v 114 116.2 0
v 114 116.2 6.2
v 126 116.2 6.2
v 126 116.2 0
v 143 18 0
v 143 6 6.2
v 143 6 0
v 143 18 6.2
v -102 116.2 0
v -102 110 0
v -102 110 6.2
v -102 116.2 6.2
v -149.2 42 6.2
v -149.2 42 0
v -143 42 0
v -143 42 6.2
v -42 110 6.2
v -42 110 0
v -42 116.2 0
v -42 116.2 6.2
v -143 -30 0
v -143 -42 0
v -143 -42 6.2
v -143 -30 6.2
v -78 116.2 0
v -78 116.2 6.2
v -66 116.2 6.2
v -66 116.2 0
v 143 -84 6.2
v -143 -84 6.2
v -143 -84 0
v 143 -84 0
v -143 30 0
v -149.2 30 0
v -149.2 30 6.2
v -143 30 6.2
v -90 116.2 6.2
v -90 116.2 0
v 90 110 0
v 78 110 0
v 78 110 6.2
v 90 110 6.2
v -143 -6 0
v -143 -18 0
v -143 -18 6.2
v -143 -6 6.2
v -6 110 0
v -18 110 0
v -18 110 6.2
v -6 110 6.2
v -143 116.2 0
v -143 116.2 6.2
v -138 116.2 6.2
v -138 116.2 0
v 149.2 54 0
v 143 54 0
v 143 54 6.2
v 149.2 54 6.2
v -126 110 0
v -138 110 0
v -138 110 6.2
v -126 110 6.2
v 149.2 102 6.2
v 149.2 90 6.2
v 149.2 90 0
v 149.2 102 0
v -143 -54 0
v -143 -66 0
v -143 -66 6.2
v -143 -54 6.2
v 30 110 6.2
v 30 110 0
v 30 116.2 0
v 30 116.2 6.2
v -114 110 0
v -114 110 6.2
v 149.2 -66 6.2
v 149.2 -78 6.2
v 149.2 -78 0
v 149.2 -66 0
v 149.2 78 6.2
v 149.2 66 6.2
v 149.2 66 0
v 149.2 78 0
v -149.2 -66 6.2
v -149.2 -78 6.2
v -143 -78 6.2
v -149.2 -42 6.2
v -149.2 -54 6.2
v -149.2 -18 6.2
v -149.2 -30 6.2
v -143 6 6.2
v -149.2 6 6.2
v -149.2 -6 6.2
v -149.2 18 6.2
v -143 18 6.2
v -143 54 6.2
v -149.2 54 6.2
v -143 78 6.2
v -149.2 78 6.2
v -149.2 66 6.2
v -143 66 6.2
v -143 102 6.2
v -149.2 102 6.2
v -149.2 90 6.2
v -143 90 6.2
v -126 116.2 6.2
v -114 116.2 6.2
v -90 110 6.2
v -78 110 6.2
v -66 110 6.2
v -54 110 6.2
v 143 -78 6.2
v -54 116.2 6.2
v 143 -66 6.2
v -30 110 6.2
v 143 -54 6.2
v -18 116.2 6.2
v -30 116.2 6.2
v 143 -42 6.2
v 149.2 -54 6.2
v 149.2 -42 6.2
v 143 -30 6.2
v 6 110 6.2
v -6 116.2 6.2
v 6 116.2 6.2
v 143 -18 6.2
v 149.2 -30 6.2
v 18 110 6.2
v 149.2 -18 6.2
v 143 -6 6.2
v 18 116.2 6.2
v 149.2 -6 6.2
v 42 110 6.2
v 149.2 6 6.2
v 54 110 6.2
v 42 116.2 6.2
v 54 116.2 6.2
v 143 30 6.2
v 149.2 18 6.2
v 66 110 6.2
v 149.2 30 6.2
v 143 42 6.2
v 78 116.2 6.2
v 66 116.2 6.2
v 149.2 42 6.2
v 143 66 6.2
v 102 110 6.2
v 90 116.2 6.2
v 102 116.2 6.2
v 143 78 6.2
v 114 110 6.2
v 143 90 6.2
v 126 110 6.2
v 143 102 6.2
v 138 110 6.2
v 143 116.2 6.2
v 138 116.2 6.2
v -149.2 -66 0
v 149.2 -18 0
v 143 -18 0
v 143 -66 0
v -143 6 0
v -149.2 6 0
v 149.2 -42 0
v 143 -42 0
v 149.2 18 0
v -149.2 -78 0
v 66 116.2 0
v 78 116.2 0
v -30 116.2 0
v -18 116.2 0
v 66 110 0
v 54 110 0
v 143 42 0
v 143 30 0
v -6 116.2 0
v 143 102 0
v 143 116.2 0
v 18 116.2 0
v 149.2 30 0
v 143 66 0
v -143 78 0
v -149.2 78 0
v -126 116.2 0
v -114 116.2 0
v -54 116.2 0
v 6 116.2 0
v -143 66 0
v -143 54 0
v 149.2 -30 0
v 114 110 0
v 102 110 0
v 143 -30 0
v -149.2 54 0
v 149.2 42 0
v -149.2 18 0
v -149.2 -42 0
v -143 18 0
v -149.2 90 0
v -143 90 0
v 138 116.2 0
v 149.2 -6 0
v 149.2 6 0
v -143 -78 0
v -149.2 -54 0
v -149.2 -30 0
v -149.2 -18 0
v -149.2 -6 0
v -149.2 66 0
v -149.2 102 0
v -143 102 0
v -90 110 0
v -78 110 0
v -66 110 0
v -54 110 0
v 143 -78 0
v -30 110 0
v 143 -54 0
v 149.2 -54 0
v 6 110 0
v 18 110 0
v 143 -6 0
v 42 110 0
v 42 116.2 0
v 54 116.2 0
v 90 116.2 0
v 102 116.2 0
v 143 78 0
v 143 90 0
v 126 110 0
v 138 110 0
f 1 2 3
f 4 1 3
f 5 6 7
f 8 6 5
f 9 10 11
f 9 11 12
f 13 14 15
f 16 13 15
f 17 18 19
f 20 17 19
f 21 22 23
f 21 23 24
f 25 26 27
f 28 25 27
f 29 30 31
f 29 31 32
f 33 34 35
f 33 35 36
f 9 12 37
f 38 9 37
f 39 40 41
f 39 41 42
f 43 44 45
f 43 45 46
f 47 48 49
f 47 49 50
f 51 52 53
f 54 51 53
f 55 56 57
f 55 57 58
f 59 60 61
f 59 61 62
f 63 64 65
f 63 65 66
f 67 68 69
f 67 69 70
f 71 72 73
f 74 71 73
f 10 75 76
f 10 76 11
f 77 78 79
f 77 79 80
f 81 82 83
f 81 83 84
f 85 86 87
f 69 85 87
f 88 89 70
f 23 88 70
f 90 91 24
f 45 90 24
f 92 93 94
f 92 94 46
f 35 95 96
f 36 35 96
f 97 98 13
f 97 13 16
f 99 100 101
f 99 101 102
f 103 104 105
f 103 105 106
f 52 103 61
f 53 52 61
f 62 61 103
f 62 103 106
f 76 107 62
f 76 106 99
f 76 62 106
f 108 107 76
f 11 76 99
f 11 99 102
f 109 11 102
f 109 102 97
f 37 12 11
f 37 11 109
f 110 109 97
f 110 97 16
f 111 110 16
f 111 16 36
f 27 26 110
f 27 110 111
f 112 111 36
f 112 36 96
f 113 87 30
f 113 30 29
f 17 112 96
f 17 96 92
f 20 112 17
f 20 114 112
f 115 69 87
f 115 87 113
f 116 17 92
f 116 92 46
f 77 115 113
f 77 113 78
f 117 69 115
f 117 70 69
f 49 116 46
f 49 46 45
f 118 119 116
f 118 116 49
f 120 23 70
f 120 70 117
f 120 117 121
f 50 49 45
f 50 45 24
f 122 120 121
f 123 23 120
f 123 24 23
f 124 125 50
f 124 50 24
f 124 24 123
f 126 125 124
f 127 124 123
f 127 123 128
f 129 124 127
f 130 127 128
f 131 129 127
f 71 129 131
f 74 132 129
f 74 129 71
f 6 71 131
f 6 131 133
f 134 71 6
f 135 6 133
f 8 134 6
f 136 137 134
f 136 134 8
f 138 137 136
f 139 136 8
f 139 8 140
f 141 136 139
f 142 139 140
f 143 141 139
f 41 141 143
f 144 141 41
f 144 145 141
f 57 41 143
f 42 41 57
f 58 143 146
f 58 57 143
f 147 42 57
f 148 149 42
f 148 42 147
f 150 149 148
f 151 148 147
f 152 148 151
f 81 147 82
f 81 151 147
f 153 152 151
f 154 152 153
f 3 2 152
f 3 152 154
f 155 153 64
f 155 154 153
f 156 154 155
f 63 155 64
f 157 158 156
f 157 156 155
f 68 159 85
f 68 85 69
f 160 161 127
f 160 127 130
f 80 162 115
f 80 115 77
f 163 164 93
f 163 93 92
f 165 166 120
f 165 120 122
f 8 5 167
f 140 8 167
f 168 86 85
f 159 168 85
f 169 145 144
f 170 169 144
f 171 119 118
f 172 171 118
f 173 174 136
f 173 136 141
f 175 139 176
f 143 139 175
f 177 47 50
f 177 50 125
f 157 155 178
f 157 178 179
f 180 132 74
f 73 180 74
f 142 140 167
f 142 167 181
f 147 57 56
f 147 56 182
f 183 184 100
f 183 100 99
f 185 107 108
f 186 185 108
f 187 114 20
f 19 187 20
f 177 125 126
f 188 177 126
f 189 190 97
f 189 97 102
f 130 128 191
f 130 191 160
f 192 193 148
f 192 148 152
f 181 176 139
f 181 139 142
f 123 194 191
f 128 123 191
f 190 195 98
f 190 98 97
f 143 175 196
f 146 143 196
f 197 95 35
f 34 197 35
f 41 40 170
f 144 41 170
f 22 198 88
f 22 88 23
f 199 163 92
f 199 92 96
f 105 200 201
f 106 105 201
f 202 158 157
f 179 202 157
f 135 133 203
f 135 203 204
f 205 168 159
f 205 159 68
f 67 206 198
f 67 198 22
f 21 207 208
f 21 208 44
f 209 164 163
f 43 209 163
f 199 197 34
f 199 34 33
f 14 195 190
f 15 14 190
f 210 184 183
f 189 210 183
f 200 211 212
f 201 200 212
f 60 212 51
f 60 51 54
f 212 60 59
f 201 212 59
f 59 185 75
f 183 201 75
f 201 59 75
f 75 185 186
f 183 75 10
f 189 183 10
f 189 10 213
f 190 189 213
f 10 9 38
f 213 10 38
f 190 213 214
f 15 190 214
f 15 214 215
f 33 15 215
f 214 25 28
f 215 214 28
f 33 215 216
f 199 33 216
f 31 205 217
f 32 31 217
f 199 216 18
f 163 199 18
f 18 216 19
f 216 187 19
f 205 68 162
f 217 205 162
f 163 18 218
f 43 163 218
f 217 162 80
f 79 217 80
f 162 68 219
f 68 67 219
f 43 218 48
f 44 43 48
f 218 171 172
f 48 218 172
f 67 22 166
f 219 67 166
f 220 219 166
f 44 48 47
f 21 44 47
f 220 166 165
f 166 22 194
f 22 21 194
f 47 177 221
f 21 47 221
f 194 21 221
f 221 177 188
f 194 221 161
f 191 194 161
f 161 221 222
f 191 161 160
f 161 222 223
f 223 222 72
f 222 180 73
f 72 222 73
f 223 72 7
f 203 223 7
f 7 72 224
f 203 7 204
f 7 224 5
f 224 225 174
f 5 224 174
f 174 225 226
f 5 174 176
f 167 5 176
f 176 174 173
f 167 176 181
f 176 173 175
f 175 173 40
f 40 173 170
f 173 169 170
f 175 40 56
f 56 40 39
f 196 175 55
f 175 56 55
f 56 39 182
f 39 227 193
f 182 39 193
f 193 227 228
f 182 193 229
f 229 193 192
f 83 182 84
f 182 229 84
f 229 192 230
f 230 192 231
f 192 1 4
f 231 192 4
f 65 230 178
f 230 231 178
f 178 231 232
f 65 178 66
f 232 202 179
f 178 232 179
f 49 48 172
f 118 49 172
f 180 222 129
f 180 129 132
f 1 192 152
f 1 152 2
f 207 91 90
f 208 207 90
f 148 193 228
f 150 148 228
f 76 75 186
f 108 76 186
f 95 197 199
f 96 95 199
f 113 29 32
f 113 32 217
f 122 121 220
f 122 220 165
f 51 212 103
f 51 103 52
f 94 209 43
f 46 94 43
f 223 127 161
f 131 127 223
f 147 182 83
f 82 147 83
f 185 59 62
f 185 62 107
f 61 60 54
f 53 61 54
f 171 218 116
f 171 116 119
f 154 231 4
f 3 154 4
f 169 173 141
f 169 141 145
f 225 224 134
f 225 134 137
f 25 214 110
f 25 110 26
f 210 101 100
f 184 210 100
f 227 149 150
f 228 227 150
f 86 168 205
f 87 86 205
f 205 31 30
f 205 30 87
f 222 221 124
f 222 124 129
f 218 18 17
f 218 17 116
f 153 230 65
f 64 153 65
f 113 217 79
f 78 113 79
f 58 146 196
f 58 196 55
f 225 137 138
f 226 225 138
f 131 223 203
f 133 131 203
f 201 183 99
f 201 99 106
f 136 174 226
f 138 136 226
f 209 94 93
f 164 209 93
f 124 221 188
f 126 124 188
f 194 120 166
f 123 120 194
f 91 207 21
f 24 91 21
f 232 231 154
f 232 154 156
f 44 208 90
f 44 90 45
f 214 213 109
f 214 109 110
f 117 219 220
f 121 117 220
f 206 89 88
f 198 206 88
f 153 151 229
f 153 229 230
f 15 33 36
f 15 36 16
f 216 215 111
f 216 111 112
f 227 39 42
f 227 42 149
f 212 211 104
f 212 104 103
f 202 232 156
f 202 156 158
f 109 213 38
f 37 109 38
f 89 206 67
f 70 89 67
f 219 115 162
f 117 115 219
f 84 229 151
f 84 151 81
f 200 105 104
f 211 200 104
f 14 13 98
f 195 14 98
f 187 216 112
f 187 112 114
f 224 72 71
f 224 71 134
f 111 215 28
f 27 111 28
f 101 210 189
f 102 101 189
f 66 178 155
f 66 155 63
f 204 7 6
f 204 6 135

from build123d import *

# Parameters (mm, degrees)
F0_W     = 286
F0_H     = 220
F1_DEPTH = 6.2
F2_W     = 5
F2_H     = 6.2
F2_W_2   = 12
F3_DEPTH = 6.2
F4_W     = 6.2
F4_H     = 12
F5_DEPTH = 6.2
F6_W     = 329.66836555
F6_H     = 26
F7_DEPTH = 6.201


with BuildPart() as f1:
    # F0 (on Top) → F1 (new body)
    with BuildSketch(Plane.XY):
        Rectangle(F0_W, F0_H)
    extrude(amount=F1_DEPTH)

    # F2 (on face) → F3 (join, through all)
    with BuildSketch(Plane.XY.offset(6.2)):
        with Locations((140.5, 113.1)):
            Rectangle(F2_W, F2_H)
        with Locations((120, 113.1)):
            Rectangle(F2_W_2, F2_H)
        with Locations((96, 113.1)):
            Rectangle(F2_W_2, F2_H)
        with Locations((72, 113.1)):
            Rectangle(F2_W_2, F2_H)
        with Locations((48, 113.1)):
            Rectangle(F2_W_2, F2_H)
        with Locations((24, 113.1)):
            Rectangle(F2_W_2, F2_H)
        with Locations((0, 113.1)):
            Rectangle(F2_W_2, F2_H)
        with Locations((-24, 113.1)):
            Rectangle(F2_W_2, F2_H)
        with Locations((-48, 113.1)):
            Rectangle(F2_W_2, F2_H)
        with Locations((-72, 113.1)):
            Rectangle(F2_W_2, F2_H)
        with Locations((-96, 113.1)):
            Rectangle(F2_W_2, F2_H)
        with Locations((-120, 113.1)):
            Rectangle(F2_W_2, F2_H)
        with Locations((-140.5, 113.1)):
            Rectangle(F2_W, F2_H)
    extrude(amount=-F3_DEPTH)

    # F4 (on face) → F5 (join, through all)
    with BuildSketch(Plane.XY.offset(6.2)):
        with Locations((146.1, -96)):
            Rectangle(F4_W, F4_H)
        with Locations((146.1, -72)):
            Rectangle(F4_W, F4_H)
        with Locations((146.1, -48)):
            Rectangle(F4_W, F4_H)
        with Locations((146.1, -24)):
            Rectangle(F4_W, F4_H)
        with Locations((146.1, 0)):
            Rectangle(F4_W, F4_H)
        with Locations((146.1, 24)):
            Rectangle(F4_W, F4_H)
        with Locations((146.1, 48)):
            Rectangle(F4_W, F4_H)
        with Locations((146.1, 72)):
            Rectangle(F4_W, F4_H)
        with Locations((146.1, 96)):
            Rectangle(F4_W, F4_H)
        with Locations((-146.1, 96)):
            Rectangle(F4_W, F4_H)
        with Locations((-146.1, 72)):
            Rectangle(F4_W, F4_H)
        with Locations((-146.1, 48)):
            Rectangle(F4_W, F4_H)
        with Locations((-146.1, 24)):
            Rectangle(F4_W, F4_H)
        with Locations((-146.1, 0)):
            Rectangle(F4_W, F4_H)
        with Locations((-146.1, -24)):
            Rectangle(F4_W, F4_H)
        with Locations((-146.1, -48)):
            Rectangle(F4_W, F4_H)
        with Locations((-146.1, -72)):
            Rectangle(F4_W, F4_H)
        with Locations((-146.1, -96)):
            Rectangle(F4_W, F4_H)
    extrude(amount=-F5_DEPTH)

    # F6 (on face) → F7 (cut, through all)
    with BuildSketch(Plane.XY.offset(6.2)):
        with Locations((15.634182775, -97)):
            Rectangle(F6_W, F6_H)
    extrude(amount=-F7_DEPTH, mode=Mode.SUBTRACT)


solid = f1.part
